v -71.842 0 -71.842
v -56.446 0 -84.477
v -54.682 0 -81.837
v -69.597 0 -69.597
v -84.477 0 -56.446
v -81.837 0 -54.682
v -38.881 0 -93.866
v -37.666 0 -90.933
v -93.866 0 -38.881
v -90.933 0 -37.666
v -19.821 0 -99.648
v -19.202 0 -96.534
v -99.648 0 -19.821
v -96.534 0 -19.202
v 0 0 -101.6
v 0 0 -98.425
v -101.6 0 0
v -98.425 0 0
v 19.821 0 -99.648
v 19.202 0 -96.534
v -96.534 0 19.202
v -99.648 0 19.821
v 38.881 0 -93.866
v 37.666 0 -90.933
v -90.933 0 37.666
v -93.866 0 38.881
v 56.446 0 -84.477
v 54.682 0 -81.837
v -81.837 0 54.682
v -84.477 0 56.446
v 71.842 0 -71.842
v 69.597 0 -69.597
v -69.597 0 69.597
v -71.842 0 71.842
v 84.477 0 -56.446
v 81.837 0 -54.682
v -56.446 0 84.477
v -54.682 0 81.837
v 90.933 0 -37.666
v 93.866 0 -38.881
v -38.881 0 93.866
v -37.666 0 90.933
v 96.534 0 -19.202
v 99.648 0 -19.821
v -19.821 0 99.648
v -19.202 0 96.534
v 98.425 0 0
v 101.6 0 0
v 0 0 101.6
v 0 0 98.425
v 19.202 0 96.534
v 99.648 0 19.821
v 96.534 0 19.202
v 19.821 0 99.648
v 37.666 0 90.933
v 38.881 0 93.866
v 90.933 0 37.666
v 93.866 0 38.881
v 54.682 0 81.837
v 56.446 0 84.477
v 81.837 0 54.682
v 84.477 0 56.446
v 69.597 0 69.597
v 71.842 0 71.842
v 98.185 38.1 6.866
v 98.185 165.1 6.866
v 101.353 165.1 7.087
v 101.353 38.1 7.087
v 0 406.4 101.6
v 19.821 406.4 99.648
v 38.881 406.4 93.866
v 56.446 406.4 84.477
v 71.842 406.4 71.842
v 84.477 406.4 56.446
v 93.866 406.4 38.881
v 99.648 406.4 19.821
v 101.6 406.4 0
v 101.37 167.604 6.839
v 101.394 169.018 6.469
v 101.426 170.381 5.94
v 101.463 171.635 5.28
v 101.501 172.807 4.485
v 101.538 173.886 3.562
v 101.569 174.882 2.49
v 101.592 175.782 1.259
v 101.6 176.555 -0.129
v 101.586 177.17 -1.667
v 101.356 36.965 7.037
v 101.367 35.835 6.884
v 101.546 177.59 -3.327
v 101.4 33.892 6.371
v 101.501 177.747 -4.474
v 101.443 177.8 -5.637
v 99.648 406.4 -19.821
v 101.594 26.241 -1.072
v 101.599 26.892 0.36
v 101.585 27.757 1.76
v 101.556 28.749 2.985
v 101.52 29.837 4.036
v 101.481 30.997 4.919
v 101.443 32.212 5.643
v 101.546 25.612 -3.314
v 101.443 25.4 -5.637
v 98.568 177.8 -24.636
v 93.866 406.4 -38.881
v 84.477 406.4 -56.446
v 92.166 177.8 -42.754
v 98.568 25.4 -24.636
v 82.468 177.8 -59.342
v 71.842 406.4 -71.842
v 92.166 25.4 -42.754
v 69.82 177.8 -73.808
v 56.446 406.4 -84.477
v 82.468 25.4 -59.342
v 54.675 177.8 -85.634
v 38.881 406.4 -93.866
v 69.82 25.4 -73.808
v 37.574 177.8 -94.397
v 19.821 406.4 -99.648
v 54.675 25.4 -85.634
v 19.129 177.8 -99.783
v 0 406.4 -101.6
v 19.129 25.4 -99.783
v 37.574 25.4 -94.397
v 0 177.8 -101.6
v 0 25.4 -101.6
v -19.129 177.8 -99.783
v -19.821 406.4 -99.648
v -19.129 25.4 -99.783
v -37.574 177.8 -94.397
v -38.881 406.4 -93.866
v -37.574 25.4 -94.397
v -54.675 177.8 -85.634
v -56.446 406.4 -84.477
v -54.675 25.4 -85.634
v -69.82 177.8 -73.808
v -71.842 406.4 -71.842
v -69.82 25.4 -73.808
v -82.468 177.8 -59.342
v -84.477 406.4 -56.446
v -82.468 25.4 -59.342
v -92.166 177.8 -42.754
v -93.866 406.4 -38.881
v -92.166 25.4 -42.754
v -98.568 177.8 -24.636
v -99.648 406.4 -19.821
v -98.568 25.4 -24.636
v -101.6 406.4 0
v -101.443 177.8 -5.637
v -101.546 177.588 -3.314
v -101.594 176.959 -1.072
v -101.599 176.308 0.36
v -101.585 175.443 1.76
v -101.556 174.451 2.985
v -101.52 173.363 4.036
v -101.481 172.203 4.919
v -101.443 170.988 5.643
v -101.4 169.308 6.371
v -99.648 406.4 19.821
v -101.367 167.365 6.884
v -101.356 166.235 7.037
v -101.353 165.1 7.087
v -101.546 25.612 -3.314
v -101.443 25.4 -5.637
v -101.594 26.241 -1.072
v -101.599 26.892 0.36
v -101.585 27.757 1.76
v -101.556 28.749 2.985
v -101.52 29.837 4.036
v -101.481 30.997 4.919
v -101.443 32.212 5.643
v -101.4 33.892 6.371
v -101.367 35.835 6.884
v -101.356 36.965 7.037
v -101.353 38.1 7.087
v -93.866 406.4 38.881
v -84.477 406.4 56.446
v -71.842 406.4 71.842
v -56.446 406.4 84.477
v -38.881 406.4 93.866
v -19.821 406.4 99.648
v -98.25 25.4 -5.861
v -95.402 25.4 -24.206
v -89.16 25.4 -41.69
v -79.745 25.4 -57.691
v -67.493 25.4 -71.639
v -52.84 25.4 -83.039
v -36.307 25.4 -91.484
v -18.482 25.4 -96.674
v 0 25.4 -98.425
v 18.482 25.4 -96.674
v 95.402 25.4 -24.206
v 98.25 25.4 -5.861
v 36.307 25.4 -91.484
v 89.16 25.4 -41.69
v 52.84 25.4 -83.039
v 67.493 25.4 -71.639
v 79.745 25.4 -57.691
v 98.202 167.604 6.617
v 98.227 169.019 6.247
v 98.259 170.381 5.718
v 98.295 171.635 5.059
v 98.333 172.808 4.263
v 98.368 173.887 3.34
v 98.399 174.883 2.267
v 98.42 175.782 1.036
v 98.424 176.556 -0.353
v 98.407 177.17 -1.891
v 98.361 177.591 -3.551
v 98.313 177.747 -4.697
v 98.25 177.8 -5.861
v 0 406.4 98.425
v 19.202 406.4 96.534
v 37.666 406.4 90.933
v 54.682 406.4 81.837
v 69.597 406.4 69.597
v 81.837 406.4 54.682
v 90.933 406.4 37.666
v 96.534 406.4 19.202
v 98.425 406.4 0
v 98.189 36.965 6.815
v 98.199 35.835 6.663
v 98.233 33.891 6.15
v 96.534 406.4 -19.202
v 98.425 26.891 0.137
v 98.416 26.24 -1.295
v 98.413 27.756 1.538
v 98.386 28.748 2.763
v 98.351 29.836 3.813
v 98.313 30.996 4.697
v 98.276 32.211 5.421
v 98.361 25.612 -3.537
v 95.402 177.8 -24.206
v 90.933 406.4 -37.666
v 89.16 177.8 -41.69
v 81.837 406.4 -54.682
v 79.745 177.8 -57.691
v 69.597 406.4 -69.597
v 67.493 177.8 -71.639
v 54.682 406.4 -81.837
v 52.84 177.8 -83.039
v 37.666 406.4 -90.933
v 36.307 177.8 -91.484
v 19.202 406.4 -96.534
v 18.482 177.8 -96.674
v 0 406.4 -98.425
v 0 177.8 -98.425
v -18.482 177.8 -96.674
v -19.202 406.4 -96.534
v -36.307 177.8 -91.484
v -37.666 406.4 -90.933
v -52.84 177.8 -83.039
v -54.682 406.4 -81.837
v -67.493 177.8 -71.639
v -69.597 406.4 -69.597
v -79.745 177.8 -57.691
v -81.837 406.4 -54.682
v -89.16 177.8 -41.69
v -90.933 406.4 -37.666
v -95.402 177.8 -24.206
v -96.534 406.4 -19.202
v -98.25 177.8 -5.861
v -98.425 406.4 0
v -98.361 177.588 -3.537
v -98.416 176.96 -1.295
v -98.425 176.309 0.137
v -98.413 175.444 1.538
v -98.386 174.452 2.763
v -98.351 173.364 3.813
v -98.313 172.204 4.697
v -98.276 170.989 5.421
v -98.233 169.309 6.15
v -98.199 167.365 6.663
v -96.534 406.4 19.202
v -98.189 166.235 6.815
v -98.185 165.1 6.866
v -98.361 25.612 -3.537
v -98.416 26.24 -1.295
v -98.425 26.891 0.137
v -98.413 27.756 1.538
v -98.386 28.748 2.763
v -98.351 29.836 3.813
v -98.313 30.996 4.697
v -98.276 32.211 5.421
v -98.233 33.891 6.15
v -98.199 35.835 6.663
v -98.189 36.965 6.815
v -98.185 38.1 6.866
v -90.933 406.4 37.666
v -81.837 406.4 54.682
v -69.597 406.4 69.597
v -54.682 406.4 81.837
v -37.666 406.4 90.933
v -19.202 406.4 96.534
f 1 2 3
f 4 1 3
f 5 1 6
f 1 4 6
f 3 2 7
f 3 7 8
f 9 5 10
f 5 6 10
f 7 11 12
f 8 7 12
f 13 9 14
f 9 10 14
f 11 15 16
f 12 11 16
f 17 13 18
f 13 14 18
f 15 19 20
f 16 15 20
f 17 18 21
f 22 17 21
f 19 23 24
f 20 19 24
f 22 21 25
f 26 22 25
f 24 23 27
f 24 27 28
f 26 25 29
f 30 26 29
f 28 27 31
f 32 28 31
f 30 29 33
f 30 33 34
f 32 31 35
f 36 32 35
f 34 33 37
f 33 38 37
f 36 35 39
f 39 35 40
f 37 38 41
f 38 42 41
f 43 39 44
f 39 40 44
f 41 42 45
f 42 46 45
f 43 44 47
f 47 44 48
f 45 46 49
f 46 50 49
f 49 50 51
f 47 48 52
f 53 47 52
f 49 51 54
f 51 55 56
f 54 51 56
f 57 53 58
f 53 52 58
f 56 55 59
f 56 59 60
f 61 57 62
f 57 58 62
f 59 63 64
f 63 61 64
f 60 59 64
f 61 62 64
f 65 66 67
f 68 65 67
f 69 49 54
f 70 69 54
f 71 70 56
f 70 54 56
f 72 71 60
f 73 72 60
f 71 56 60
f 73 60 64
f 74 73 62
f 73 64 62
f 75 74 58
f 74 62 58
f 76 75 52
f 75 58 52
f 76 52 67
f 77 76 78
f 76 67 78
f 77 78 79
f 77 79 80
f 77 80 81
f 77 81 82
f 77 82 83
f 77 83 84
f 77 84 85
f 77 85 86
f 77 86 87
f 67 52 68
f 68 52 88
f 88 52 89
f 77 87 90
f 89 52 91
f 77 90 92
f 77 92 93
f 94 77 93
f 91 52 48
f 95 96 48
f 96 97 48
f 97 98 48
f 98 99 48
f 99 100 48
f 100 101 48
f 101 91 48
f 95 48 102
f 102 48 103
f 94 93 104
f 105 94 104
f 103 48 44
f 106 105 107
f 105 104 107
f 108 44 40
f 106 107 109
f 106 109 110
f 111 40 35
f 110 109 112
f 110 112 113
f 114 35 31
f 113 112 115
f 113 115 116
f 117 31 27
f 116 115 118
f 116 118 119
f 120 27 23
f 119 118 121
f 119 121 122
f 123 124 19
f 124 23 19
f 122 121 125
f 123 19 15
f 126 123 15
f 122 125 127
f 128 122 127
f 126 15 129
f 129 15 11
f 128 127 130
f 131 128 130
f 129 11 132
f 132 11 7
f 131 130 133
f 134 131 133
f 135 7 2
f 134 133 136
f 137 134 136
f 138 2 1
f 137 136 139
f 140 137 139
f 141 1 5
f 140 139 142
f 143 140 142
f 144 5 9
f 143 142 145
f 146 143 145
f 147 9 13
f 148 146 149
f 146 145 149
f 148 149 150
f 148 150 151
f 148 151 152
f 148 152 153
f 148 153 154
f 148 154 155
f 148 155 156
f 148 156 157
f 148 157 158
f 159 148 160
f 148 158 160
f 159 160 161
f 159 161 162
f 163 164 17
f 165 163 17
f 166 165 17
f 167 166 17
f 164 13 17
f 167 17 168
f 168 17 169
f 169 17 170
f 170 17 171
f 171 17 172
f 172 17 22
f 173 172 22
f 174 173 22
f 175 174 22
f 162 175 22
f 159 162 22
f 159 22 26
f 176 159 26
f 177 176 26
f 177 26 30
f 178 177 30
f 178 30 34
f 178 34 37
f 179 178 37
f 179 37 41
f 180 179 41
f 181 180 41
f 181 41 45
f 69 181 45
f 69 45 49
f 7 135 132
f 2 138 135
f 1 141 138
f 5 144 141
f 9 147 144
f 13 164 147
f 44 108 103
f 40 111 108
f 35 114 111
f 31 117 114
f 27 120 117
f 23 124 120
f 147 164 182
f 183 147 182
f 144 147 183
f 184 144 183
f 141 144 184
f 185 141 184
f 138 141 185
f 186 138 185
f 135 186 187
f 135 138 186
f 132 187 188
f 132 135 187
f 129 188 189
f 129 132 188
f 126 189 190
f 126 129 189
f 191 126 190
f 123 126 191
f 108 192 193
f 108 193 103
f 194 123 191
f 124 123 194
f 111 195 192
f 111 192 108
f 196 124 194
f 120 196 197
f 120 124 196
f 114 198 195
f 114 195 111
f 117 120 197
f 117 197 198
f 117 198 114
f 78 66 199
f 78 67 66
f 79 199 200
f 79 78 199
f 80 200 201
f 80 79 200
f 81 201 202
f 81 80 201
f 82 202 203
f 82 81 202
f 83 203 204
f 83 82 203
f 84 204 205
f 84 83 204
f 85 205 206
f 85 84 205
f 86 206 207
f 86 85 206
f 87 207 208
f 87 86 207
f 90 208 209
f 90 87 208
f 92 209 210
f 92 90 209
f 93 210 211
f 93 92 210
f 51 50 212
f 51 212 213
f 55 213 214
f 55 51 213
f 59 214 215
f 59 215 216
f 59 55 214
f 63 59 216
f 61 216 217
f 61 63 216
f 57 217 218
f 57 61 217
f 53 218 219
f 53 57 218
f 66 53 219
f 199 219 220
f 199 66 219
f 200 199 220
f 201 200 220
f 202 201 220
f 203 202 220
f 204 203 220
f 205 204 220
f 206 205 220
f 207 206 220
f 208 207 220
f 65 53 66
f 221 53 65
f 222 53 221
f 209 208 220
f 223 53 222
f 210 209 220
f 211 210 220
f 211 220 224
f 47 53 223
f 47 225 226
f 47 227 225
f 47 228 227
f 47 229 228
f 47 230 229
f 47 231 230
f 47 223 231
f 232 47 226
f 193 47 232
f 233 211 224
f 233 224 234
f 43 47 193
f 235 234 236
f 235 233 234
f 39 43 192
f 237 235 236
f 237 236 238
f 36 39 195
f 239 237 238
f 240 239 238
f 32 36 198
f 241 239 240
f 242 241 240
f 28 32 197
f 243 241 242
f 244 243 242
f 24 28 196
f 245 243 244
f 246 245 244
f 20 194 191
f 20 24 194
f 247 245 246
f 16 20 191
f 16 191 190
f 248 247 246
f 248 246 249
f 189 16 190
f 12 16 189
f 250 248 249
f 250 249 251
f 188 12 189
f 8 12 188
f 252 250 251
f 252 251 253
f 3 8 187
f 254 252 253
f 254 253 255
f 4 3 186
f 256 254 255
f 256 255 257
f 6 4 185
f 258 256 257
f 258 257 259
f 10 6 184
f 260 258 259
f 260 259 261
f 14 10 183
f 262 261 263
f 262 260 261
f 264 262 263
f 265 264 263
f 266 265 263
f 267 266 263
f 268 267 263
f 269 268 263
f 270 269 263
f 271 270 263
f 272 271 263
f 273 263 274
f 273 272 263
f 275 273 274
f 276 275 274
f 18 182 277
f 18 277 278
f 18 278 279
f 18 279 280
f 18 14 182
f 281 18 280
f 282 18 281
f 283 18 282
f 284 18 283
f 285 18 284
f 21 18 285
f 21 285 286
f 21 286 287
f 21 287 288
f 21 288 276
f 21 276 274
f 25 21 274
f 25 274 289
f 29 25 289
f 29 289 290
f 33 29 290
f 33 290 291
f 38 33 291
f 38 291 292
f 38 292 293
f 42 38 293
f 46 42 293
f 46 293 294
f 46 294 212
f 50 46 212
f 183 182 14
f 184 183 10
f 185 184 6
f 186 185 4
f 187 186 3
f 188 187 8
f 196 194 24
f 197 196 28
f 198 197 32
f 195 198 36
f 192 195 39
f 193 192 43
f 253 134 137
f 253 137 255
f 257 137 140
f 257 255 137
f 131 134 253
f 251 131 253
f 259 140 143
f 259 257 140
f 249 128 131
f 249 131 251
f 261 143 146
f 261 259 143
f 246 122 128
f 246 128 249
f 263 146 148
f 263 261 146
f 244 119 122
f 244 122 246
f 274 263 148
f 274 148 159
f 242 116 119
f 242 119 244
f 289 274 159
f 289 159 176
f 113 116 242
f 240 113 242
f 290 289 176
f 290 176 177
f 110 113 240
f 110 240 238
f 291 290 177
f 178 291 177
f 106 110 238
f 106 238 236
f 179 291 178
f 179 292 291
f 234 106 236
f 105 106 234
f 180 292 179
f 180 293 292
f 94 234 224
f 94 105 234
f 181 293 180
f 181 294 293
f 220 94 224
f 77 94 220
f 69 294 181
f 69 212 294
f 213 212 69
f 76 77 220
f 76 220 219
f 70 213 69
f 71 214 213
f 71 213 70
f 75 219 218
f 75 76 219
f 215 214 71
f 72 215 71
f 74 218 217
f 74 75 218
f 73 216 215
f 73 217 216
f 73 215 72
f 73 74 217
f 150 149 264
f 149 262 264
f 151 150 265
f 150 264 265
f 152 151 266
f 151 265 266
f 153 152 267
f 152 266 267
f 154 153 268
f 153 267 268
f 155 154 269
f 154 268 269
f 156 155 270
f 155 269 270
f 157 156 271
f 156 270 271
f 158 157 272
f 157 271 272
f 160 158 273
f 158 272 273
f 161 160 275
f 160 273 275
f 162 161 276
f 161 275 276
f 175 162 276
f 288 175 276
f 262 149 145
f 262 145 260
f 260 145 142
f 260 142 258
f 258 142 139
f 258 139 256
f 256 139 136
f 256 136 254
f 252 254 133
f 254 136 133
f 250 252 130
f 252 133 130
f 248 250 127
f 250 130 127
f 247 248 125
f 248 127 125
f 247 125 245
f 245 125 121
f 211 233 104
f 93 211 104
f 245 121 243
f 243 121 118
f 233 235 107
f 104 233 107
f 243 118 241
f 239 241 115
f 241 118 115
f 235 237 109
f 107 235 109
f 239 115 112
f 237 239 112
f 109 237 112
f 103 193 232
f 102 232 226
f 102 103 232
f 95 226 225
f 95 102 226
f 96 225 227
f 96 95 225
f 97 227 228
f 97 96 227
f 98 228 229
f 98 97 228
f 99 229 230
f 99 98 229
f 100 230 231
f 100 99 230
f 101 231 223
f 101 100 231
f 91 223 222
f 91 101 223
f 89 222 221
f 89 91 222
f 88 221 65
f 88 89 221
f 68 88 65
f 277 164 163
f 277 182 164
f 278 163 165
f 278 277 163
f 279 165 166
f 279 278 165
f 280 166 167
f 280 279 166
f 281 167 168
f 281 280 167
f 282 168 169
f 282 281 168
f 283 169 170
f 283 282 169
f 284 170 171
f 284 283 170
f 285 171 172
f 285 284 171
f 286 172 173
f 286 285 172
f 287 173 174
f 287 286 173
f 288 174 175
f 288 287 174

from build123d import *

# Parameters (mm, degrees)
SKETCH1_R           = 101.6
SKETCH1_R_2         = 98.425
BOSS_EXTRUDE1_DEPTH = 406.4
CUT_EXTRUDE2_START  = 25.4
CUT_EXTRUDE2_DEPTH  = 152.4
FILLET1_R           = 12.7


with BuildPart() as part:
    # Sketch1 → Boss-Extrude1 (new body)
    with BuildSketch(Plane(origin=(0, 0, 0), x_dir=(1, 0, 0), z_dir=(0, 1, 0))):
        with Locations(Location((0, 0, 0), (0, 0, 270))):
            Circle(SKETCH1_R)
        with Locations(Location((0, 0, 0), (0, 0, 270))):
            Circle(SKETCH1_R_2, mode=Mode.SUBTRACT)
    extrude(amount=BOSS_EXTRUDE1_DEPTH)

    # Sketch3 → Cut-Extrude2 (cut)
    with BuildSketch(Plane(origin=(0, 0, 0), x_dir=(1, 0, 0), z_dir=(0, 1, 0)).offset(CUT_EXTRUDE2_START)):
        with BuildLine():
            Line((-101.352507506, -7.087257732), (-98.185241647, -6.865780928))
            ThreePointArc((-98.185241647, -6.865780928), (-71.983488082, 67.125688589), (0, 98.425))
            Line((0, 98.425), (0, 101.6))
            ThreePointArc((0, 101.6), (-74.305536085, 69.291033382), (-101.352507506, -7.087257732))
        make_face()
        with BuildLine():
            ThreePointArc((98.425, 0), (98.365042149, -3.434982963), (98.185241647, -6.865780928))
            Line((98.185241647, -6.865780928), (101.352507506, -7.087257732))
            ThreePointArc((101.352507506, -7.087257732), (101.538108025, -3.545788865), (101.6, 0))
            ThreePointArc((101.6, 0), (71.842048969, 71.842048969), (0, 101.6))
            Line((0, 101.6), (0, 98.425))
            ThreePointArc((0, 98.425), (69.596984938, 69.596984938), (98.425, 0))
        make_face()
    extrude(amount=CUT_EXTRUDE2_DEPTH, mode=Mode.SUBTRACT)

    # Fillet1
    fillet1_edges = [part.edges().sort_by_distance(p)[0] for p in [
        (99.768874577, 25.4, 6.97651933),
        (-99.768874577, 177.8, 6.97651933),
        (99.768874577, 177.8, 6.97651933),
        (-99.768874577, 25.4, 6.97651933),
    ]]
    fillet(fillet1_edges, radius=FILLET1_R)


solid = part.part
